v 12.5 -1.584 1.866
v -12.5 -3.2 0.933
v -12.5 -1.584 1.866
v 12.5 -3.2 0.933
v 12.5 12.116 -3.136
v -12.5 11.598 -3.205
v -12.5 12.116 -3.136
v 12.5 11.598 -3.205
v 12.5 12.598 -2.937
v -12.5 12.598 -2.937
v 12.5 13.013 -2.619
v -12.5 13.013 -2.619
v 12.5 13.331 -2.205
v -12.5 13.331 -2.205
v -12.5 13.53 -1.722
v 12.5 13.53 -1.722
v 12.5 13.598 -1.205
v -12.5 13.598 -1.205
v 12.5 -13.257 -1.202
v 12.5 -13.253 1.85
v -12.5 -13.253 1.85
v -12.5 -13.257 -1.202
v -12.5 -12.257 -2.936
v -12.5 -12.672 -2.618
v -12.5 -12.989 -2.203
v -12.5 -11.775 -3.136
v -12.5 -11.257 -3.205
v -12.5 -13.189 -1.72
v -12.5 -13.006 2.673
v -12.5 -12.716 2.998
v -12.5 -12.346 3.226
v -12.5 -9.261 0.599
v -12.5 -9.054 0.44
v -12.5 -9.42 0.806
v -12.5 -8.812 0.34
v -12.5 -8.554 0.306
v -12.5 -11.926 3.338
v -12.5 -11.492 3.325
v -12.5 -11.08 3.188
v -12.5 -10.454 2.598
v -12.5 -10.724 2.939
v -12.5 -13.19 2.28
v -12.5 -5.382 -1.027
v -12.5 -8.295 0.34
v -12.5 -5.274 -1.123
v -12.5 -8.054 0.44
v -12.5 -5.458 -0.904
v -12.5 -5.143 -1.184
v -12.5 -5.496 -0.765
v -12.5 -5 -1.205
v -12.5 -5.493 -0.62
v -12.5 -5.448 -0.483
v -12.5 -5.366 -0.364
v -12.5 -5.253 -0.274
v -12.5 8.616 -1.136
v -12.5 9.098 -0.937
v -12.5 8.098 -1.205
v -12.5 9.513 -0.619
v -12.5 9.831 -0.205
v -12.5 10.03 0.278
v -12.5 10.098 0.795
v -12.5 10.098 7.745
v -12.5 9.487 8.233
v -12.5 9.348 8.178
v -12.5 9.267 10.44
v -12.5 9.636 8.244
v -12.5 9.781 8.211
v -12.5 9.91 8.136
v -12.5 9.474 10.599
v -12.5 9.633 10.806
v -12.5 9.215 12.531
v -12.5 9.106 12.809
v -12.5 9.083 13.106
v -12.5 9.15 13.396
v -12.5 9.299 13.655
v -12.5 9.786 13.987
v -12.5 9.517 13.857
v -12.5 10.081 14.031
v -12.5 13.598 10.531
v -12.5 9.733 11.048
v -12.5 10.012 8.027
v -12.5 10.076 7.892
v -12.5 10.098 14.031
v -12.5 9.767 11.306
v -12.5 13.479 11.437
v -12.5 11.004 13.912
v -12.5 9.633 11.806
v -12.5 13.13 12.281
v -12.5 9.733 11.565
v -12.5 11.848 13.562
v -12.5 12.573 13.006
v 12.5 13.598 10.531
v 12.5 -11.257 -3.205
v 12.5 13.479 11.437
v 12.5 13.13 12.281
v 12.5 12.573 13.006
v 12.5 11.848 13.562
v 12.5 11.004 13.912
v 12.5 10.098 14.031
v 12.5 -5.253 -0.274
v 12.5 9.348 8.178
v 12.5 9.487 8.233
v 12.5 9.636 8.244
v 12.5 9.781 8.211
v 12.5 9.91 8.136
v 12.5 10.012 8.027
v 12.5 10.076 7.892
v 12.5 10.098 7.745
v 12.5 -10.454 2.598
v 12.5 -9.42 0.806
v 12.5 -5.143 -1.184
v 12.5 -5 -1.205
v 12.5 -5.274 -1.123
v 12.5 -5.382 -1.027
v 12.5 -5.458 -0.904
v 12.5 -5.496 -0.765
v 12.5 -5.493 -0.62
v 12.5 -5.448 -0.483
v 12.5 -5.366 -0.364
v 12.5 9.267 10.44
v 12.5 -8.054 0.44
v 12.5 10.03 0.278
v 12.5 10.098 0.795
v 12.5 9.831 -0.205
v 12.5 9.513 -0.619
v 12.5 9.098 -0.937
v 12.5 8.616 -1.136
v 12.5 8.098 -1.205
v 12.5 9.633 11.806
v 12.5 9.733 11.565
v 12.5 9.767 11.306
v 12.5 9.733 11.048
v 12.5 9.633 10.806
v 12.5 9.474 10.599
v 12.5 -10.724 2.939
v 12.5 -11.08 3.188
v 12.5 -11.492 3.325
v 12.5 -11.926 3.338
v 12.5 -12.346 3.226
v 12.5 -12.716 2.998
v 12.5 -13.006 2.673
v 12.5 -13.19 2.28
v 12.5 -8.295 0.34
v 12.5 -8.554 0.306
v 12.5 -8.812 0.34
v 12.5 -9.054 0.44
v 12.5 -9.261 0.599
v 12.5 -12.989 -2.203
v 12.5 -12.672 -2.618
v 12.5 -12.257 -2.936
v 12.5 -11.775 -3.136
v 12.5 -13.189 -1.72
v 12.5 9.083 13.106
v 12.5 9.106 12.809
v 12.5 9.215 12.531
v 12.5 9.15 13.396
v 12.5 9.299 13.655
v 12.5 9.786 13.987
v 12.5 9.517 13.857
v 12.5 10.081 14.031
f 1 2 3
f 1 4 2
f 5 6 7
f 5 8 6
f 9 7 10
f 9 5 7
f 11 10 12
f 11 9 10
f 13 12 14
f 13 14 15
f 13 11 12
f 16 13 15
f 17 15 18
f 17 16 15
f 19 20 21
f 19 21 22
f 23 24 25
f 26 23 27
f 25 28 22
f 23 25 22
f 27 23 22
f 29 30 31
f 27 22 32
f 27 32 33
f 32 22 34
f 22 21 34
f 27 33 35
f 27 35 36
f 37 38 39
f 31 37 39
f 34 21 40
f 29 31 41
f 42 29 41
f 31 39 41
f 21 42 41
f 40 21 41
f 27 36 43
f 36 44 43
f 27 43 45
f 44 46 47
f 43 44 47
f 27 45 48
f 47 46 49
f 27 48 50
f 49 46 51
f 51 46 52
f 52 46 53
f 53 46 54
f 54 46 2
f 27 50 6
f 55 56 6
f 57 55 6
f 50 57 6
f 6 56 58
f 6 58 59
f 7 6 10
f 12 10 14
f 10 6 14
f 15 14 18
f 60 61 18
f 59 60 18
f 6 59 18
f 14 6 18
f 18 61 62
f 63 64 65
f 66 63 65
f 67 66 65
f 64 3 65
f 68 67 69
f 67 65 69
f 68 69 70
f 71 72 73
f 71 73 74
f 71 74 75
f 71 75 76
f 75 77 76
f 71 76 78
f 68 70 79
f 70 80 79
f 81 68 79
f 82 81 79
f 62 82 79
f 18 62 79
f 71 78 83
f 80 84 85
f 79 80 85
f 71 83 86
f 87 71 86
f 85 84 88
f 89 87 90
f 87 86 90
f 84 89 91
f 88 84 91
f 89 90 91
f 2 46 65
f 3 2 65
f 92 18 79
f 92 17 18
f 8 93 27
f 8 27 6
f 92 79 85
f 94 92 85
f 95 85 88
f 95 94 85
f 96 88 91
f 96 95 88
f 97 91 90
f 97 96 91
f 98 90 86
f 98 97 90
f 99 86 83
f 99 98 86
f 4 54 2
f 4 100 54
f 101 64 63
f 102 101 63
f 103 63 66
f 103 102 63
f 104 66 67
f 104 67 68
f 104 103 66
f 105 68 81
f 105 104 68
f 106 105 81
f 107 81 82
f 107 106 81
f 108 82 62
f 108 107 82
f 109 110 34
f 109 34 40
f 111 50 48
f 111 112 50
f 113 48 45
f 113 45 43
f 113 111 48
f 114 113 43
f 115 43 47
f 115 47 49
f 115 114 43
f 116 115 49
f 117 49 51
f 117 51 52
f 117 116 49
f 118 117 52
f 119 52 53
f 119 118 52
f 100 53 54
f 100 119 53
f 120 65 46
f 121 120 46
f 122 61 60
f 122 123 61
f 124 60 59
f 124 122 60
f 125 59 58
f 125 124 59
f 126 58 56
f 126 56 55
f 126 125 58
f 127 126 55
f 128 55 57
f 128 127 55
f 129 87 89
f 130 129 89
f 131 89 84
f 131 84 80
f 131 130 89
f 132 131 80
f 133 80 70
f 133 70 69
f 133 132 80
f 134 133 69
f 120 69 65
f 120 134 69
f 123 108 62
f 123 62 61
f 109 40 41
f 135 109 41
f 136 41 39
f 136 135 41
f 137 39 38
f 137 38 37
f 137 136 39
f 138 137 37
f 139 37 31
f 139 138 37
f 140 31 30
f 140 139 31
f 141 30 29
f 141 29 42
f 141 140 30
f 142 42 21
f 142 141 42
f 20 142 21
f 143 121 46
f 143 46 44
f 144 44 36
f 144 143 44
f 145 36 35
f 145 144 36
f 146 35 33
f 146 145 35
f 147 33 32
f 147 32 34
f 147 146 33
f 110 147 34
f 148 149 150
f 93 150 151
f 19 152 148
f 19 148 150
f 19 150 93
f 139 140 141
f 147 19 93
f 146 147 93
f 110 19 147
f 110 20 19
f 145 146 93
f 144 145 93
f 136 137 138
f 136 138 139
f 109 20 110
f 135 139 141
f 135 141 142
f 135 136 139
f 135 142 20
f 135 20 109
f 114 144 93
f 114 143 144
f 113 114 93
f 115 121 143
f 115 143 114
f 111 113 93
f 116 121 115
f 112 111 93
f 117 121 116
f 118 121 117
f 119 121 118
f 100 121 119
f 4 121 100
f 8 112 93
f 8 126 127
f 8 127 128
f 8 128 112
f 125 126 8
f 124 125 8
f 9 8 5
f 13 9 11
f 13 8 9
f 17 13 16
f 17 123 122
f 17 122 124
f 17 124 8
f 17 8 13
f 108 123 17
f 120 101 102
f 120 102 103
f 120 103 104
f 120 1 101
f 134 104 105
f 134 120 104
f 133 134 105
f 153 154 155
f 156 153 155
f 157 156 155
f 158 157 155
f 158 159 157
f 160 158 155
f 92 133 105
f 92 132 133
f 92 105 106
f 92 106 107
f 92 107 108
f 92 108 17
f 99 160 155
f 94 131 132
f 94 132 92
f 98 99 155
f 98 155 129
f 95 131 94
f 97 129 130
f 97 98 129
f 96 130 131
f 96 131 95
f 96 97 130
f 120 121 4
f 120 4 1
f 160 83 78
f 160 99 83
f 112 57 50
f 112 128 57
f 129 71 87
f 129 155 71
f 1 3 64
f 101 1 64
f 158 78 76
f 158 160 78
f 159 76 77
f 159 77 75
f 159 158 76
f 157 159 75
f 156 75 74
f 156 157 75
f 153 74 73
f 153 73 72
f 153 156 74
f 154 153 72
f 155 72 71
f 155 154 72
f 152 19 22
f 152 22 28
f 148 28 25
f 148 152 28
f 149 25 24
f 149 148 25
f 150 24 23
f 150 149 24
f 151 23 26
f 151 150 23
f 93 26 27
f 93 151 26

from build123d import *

# Parameters (mm, degrees)
F1_DEPTH      = 12.5
F1_DEPTH_BACK = 12.5


with BuildPart() as f1:
    # F0 (on Right) → F1 (new body, two sides)
    with BuildSketch(Plane.YZ) as f1_sk:
        with BuildLine():
            ThreePointArc((9.632908, 11.806406), (9.732809, 11.047587), (9.266883, 10.440381))
            Line((9.266883, 10.440381), (-8.053625, 0.440381))
            ThreePointArc((-8.053625, 0.440381), (-8.812444, 0.34048), (-9.41965, 0.806406))
            Line((-9.41965, 0.806406), (-10.454072, 2.598076))
            ThreePointArc((-10.454072, 2.598076), (-12.140511, 3.297186), (-13.253109, 1.849789))
            Line((-13.253109, 1.849789), (-13.256593, -1.202352))
            ThreePointArc((-13.256593, -1.202352), (-12.671615, -2.618041), (-11.256594, -3.204635))
            Line((-11.256594, -3.204635), (11.598487, -3.204635))
            ThreePointArc((11.598487, -3.204635), (13.012701, -2.618849), (13.598487, -1.204635))
            Line((13.598487, -1.204635), (13.598487, 10.531089))
            ThreePointArc((13.598487, 10.531089), (12.573361, 13.005963), (10.098487, 14.031089))
            Line((10.098487, 14.031089), (10.080538, 14.031089))
            ThreePointArc((10.080538, 14.031089), (9.214513, 13.531089), (9.214513, 12.531089))
            Line((9.214513, 12.531089), (9.632908, 11.806406))
        make_face()
        with BuildLine():
            Line((10.098487, 7.745081), (10.098487, 0.795365))
            ThreePointArc((10.098487, 0.795365), (9.512701, -0.618849), (8.098487, -1.204635))
            Line((8.098487, -1.204635), (-4.999951, -1.204635))
            ThreePointArc((-4.999951, -1.204635), (-5.482408, -0.835916), (-5.253301, -0.273574))
            Line((-5.253301, -0.273574), (-3.200361, 0.933013))
            Line((-3.200361, 0.933013), (-1.584336, 1.866025))
            Line((-1.584336, 1.866025), (9.348487, 8.178094))
            ThreePointArc((9.348487, 8.178094), (9.848487, 8.178094), (10.098487, 7.745081))
        make_face(mode=Mode.SUBTRACT)
    extrude(amount=F1_DEPTH)
    extrude(f1_sk.sketch, amount=-F1_DEPTH_BACK)


solid = f1.part
